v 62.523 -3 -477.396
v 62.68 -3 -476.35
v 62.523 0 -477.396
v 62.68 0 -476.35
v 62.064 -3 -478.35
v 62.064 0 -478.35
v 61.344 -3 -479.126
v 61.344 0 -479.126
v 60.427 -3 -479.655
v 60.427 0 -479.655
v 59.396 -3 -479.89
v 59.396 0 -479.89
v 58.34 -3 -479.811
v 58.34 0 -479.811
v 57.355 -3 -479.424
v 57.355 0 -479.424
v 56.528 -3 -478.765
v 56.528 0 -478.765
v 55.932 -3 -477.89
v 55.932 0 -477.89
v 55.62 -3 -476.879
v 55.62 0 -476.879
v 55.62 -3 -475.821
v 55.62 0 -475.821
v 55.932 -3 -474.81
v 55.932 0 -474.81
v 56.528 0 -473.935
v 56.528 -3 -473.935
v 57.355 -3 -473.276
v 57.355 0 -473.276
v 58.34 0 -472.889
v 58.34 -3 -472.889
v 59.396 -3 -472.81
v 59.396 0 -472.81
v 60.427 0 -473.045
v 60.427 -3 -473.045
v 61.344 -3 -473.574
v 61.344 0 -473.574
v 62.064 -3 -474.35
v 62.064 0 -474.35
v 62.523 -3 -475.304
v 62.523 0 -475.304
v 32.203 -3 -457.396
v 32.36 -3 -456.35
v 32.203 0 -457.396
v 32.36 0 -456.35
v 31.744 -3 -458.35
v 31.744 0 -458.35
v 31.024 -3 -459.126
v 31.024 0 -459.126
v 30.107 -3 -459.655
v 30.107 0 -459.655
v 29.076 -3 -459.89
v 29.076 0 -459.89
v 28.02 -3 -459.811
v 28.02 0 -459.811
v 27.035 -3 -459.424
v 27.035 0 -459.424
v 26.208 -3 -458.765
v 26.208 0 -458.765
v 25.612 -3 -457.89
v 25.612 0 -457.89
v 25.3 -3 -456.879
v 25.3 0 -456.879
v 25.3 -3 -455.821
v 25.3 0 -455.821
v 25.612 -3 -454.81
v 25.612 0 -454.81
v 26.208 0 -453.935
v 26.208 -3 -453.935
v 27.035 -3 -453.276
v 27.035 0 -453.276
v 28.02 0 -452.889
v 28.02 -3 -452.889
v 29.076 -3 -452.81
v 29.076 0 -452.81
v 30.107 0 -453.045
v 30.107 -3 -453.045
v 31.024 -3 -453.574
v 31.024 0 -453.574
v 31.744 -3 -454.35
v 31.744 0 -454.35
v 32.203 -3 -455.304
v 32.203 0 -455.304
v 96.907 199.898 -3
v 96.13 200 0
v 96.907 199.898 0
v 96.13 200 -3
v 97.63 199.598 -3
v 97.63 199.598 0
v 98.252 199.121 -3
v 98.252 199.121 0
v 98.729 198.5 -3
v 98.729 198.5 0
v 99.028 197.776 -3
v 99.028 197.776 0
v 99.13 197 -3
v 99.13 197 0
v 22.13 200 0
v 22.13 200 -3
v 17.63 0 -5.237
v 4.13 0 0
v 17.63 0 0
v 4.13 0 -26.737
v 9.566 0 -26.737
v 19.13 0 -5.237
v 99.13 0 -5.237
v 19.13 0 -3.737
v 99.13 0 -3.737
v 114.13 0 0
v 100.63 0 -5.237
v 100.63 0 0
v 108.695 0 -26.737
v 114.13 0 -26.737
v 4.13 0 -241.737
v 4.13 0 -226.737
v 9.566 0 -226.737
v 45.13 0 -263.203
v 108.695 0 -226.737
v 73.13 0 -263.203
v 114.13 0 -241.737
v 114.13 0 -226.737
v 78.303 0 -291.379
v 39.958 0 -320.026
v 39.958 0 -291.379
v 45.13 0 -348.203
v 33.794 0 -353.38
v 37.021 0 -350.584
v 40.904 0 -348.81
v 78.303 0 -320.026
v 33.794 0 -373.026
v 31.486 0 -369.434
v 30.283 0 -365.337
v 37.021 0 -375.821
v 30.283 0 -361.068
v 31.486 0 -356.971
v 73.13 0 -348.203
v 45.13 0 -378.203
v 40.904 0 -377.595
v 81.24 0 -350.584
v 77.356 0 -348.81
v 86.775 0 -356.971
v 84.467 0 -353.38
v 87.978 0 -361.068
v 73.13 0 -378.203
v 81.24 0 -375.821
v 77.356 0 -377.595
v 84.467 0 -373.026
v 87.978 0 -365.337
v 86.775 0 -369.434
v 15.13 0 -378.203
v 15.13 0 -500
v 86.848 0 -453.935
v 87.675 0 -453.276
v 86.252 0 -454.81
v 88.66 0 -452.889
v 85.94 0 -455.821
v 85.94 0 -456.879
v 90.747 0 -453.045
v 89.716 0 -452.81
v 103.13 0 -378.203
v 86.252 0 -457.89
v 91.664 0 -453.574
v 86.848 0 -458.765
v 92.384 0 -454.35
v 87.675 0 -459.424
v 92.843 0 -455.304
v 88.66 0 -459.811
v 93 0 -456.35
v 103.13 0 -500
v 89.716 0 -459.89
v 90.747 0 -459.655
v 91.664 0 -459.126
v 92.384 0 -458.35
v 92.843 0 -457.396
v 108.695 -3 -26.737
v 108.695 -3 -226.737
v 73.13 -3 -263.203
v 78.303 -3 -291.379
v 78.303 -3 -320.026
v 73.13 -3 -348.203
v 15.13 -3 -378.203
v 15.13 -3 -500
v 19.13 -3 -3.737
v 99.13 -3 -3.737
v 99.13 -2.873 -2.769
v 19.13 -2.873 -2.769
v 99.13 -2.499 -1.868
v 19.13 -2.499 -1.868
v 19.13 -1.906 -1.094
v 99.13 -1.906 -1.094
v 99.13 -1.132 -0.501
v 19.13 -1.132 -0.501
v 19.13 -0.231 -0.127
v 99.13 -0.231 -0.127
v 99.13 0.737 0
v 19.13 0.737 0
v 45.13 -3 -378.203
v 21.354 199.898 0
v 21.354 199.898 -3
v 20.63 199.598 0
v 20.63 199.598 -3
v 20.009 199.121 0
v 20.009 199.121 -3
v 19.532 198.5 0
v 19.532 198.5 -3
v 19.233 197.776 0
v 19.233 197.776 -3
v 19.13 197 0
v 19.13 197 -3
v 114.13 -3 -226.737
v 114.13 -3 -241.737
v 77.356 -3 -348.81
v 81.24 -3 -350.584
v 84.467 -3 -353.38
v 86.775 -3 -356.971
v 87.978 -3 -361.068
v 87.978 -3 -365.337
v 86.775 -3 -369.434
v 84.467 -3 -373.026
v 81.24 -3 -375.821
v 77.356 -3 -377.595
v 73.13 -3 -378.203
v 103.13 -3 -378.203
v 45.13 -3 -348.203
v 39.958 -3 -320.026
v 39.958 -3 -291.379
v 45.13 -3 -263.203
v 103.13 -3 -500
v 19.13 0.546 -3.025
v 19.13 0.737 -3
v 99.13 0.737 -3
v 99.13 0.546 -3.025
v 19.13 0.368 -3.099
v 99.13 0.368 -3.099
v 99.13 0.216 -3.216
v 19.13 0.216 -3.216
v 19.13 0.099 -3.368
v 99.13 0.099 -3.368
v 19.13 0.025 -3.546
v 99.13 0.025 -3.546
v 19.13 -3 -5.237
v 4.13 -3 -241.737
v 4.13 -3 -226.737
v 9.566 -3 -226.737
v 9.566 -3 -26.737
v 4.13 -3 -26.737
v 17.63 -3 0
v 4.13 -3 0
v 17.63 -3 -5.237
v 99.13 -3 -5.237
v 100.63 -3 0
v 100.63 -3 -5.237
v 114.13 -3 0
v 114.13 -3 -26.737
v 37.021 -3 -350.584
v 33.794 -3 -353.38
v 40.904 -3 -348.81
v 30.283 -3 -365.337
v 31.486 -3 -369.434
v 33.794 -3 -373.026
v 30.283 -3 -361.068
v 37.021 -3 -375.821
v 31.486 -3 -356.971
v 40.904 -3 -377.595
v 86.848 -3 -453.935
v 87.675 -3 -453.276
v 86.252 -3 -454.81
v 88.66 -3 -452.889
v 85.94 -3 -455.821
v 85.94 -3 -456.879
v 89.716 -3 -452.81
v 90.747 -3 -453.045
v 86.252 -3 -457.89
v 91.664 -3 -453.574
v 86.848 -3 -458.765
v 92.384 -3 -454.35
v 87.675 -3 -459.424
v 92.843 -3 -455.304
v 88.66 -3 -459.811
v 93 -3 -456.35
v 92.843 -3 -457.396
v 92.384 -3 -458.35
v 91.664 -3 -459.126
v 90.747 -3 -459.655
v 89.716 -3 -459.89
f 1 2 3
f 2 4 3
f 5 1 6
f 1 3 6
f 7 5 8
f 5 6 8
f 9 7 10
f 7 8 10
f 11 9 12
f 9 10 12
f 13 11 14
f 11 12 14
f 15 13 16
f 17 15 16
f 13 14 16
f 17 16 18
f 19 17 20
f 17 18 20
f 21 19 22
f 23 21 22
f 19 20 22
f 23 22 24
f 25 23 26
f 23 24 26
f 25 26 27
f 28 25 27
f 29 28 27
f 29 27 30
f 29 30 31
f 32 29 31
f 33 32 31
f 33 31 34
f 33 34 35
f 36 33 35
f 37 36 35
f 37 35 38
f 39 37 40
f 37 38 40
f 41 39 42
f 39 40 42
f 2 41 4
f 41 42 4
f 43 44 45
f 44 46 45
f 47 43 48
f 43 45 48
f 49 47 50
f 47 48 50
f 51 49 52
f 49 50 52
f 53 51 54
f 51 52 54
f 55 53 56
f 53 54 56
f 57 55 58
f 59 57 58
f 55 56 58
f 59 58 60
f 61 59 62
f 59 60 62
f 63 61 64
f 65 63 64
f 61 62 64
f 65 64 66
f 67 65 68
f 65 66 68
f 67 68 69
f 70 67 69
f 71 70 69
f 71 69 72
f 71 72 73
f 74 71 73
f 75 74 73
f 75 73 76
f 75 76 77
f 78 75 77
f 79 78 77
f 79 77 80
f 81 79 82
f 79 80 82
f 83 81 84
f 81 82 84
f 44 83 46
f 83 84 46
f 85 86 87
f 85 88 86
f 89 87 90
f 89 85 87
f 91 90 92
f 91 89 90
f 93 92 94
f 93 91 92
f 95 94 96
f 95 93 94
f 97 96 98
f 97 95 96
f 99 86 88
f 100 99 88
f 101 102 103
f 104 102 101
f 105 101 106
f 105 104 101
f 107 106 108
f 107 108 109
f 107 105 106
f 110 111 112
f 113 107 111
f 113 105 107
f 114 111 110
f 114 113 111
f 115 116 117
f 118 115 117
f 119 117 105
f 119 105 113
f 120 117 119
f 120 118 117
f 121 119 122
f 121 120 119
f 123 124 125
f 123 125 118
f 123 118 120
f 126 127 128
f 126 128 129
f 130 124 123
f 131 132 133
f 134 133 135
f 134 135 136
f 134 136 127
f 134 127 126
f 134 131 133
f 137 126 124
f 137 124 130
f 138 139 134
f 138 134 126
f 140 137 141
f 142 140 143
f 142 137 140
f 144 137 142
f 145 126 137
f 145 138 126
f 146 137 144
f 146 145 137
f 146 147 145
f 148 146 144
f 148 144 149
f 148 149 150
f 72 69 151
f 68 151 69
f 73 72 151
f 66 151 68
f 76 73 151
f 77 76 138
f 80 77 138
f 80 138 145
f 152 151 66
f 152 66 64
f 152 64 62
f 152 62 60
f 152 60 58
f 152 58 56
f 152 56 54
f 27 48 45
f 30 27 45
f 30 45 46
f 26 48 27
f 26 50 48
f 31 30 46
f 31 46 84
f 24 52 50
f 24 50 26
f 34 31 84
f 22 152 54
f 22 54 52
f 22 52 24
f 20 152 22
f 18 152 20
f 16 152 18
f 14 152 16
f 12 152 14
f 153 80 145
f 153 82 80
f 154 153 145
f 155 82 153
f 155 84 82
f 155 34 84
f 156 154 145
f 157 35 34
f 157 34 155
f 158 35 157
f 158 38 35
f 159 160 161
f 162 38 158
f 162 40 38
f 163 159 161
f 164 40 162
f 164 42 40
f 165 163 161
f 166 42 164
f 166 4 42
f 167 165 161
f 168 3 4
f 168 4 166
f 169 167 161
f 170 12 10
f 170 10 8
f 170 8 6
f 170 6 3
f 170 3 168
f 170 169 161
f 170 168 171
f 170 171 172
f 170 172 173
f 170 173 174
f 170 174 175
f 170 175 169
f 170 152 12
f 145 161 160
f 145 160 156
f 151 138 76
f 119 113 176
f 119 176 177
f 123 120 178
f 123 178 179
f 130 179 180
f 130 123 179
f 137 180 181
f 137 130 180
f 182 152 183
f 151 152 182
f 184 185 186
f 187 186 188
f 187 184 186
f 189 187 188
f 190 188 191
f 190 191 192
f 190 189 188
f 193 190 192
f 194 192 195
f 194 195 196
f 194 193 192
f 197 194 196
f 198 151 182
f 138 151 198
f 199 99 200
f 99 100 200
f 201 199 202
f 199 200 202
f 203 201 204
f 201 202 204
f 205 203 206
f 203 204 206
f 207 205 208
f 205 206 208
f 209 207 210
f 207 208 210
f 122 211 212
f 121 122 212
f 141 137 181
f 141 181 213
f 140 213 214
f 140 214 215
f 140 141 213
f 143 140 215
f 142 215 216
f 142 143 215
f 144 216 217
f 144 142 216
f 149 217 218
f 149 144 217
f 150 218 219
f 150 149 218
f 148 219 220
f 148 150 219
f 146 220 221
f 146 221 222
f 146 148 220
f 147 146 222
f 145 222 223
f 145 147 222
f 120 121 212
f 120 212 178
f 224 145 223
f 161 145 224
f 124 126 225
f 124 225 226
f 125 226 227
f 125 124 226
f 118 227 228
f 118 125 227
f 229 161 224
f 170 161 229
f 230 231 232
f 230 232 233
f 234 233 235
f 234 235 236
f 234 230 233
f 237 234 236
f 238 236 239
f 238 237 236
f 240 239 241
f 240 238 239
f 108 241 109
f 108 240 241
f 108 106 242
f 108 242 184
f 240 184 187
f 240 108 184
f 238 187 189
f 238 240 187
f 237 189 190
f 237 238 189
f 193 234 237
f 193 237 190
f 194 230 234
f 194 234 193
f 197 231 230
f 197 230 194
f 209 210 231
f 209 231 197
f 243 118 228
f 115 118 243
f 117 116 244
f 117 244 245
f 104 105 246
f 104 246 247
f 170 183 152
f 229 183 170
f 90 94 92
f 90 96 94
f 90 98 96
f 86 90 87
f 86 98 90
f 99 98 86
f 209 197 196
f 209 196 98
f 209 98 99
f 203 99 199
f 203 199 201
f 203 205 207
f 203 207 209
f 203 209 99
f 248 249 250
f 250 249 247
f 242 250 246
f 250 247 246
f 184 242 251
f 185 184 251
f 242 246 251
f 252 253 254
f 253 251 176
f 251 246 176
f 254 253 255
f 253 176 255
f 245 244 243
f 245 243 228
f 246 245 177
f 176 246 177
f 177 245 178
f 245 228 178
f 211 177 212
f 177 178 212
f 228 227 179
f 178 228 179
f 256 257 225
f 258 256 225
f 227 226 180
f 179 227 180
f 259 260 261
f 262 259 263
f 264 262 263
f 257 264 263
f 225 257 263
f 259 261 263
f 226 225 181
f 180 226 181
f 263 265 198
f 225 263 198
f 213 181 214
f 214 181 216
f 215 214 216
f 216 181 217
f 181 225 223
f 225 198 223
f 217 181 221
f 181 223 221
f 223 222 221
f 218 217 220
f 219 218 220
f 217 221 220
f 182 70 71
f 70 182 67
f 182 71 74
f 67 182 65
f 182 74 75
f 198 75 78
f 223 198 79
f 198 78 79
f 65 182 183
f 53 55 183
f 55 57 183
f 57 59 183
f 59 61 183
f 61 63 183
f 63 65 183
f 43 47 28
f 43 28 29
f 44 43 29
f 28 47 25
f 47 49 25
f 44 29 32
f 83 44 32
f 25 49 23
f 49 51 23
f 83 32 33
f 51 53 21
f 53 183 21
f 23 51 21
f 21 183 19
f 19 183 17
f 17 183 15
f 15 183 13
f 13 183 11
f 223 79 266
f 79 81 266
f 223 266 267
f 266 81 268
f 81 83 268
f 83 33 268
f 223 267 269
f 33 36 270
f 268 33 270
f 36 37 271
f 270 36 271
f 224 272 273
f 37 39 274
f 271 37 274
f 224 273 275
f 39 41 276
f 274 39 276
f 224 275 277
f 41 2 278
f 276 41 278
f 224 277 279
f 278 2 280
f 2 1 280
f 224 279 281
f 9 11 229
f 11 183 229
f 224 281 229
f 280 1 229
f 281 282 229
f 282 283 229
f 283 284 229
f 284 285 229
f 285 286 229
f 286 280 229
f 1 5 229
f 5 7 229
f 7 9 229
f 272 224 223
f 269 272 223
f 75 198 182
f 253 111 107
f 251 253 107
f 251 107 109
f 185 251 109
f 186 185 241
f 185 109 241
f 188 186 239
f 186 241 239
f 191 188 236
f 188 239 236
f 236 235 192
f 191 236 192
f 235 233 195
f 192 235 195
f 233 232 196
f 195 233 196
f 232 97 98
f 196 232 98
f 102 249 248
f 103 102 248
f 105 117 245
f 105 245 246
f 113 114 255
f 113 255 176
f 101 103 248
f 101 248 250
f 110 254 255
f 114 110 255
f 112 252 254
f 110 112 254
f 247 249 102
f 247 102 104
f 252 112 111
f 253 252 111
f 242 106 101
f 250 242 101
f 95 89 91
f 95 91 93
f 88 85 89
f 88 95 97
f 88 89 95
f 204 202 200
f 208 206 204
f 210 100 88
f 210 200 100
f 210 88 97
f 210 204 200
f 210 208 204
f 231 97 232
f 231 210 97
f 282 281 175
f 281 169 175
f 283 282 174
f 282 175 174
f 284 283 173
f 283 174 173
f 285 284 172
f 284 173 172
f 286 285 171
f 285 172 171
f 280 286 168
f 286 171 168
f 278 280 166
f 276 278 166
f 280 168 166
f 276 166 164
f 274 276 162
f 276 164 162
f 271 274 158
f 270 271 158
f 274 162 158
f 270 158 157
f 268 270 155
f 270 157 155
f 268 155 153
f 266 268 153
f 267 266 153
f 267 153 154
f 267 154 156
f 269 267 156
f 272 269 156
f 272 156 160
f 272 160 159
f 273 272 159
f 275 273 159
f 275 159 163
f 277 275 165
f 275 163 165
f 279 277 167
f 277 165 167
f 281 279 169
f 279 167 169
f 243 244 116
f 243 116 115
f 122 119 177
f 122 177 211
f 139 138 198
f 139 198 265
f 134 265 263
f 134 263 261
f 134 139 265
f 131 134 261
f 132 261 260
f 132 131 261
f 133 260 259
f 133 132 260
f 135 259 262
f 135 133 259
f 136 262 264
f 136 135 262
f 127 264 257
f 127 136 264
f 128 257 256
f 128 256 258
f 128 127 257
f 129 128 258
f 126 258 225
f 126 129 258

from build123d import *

# Parameters (mm, degrees)
BASE_FLANGE1_START                     = -3
BASE_FLANGE1_OUTLINE_W                 = 110
BASE_FLANGE1_OUTLINE_H                 = 500
BASE_FLANGE1_DEPTH                     = 3
T_LE_PLI_E_SUR_AR_TE1_STRIP_W          = 13.4732
T_LE_PLI_E_SUR_AR_TE1_STRIP_H          = 3
T_LE_PLI_E_SUR_AR_TE1_STRIP_CUT_DEPTH  = 80
T_LE_PLI_E_SUR_AR_TE1_RELIEF_W         = 14.9732
T_LE_PLI_E_SUR_AR_TE1_RELIEF_H         = 1.5
T_LE_PLI_E_SUR_AR_TE1_RELIEF_CUT_DEPTH = 3
T_LE_PLI_E_SUR_AR_TE1_DEPTH            = 80
FILLET2_R                              = 3
CUT_EXTRUDE2_DEPTH                     = 552.574796719
CUT_EXTRUDE2_DEPTH_BACK                = 3
F_7_1_7_1_DIAMETER_SLOT1_D             = 7.1
F_7_1_7_1_DIAMETER_SLOT1_DEPTH         = 3
F_7_1_7_1_DIAMETER_SLOT1_TIP           = 2.133055198


# Read off the part's stored shape, not the designer's step: Base-Flange1
# Sheet-metal steps are written as plain solids
with BuildPart() as part:
    # Base-Flange1 outline → Base-Flange1 (new body)
    with BuildSketch(Plane(origin=(0, 0, 0), x_dir=(1, 0, 0), z_dir=(0, 1, 0)).offset(BASE_FLANGE1_START)):
        with Locations((59.130435799, 250)):
            Rectangle(BASE_FLANGE1_OUTLINE_W, BASE_FLANGE1_OUTLINE_H)
    extrude(amount=BASE_FLANGE1_DEPTH)

    # Tôle pliée sur arête1 strip (across the edge) → Tôle pliée sur arête1 strip cut (cut)
    with BuildSketch(Plane(origin=(19.130435799, 0, 0), x_dir=(0, 0, -1), z_dir=(1, 0, 0))):
        with Locations((-3, -1.5)):
            Rectangle(T_LE_PLI_E_SUR_AR_TE1_STRIP_W, T_LE_PLI_E_SUR_AR_TE1_STRIP_H)
    extrude(amount=T_LE_PLI_E_SUR_AR_TE1_STRIP_CUT_DEPTH, mode=Mode.SUBTRACT)

    # Tôle pliée sur arête1 relief (on the sheet) → Tôle pliée sur arête1 relief cut (cut)
    with BuildSketch(Plane(origin=(19.130435799, 0, -3.7366), x_dir=(0, 0, -1), z_dir=(0, 1, 0))):
        with Locations((-5.9866, 0.75)):
            Rectangle(T_LE_PLI_E_SUR_AR_TE1_RELIEF_W, T_LE_PLI_E_SUR_AR_TE1_RELIEF_H)
        with Locations((-5.9866, -80.75)):
            Rectangle(T_LE_PLI_E_SUR_AR_TE1_RELIEF_W, T_LE_PLI_E_SUR_AR_TE1_RELIEF_H)
    extrude(amount=-T_LE_PLI_E_SUR_AR_TE1_RELIEF_CUT_DEPTH, mode=Mode.SUBTRACT)

    # Tôle pliée sur arête1 section (across the edge) → Tôle pliée sur arête1 (add)
    with BuildSketch(Plane(origin=(19.130435799, 0, 0), x_dir=(0, 0, -1), z_dir=(1, 0, 0))):
        with BuildLine():
            Line((0, 0.7366), (0, 200))
            Line((0, 200), (3, 200))
            Line((3, 200), (3, 0.7366))
            ThreePointArc((3, 0.7366), (3.215745145, 0.215745145), (3.7366, 0))
            Line((3.7366, 0), (3.7366, -3))
            ThreePointArc((3.7366, -3), (1.094424801, -1.905575199), (0, 0.7366))
        make_face()
    extrude(amount=T_LE_PLI_E_SUR_AR_TE1_DEPTH)

    # Fillet2
    fillet2_edges = [part.edges().sort_by_distance(p)[0] for p in [
        (19.130435799, 200, -1.5),
        (99.130435799, 200, -1.5),
        (4.130435799, -1.5, -500),
        (114.130435799, -1.5, -500),
    ]]
    fillet(fillet2_edges, radius=FILLET2_R)

    # Sketch14 → Cut-Extrude2 (cut, two sides: drawn at the far end of the back side and taken through both)
    with BuildSketch(Plane.XZ.offset(3).offset(-CUT_EXTRUDE2_DEPTH_BACK)):
        with BuildLine():
            Line((1095.888112959, -26.7366), (114.130435799, -26.7366))
            Line((114.130435799, -26.7366), (108.694609025, -26.7366))
            Line((108.694609025, -26.7366), (108.694609025, -226.7366))
            Line((108.694609025, -226.7366), (114.130435799, -226.7366))
            Line((114.130435799, -226.7366), (114.130435799, -241.7366))
            Line((114.130435799, -241.7366), (73.130435799, -263.202647067))
            ThreePointArc((73.130435799, -263.202647067), (78.953729303, -305.702647067), (73.130435799, -348.202647067))
            ThreePointArc((73.130435799, -348.202647067), (88.130435799, -363.202647067), (73.130435799, -378.202647067))
            Line((73.130435799, -378.202647067), (103.130435799, -378.202647067))
            Line((103.130435799, -378.202647067), (103.130435799, -500))
            Line((103.130435799, -500), (15.130435799, -500))
            Line((15.130435799, -500), (15.130435799, -378.202647067))
            Line((15.130435799, -378.202647067), (45.130435799, -378.202647067))
            ThreePointArc((45.130435799, -378.202647067), (30.130435799, -363.202647067), (45.130435799, -348.202647067))
            ThreePointArc((45.130435799, -348.202647067), (39.307142295, -305.702647067), (45.130435799, -263.202647067))
            Line((45.130435799, -263.202647067), (4.130435799, -241.7366))
            Line((4.130435799, -241.7366), (4.130435799, -226.7366))
            Line((4.130435799, -226.7366), (9.566262574, -226.7366))
            Line((9.566262574, -226.7366), (9.566262574, -26.7366))
            Line((9.566262574, -26.7366), (4.130435799, -26.7366))
            Line((4.130435799, -26.7366), (-977.62724136, -26.7366))
            Line((-977.62724136, -26.7366), (-977.62724136, -1990.251954319))
            Line((-977.62724136, -1990.251954319), (1095.888112959, -1990.251954319))
            Line((1095.888112959, -1990.251954319), (1095.888112959, -26.7366))
        make_face()
    extrude(amount=CUT_EXTRUDE2_DEPTH + CUT_EXTRUDE2_DEPTH_BACK, mode=Mode.SUBTRACT)

    # Ø7.1 (7.1) Diameter Slot1
    with Locations(Plane(origin=(0, -3, 0), x_dir=(-1, 0, 0), z_dir=(0, -1, 0))):
        with Locations((-59.130435799, 476.35), (-89.450435799, 456.35), (-28.810435799, 456.35)):
            Hole(F_7_1_7_1_DIAMETER_SLOT1_D / 2, depth=F_7_1_7_1_DIAMETER_SLOT1_DEPTH)
            with Locations((0, 0, -(F_7_1_7_1_DIAMETER_SLOT1_DEPTH + F_7_1_7_1_DIAMETER_SLOT1_TIP / 2))):  # 118° drill point
                Cone(0, F_7_1_7_1_DIAMETER_SLOT1_D / 2, F_7_1_7_1_DIAMETER_SLOT1_TIP, mode=Mode.SUBTRACT)


solid = part.part
